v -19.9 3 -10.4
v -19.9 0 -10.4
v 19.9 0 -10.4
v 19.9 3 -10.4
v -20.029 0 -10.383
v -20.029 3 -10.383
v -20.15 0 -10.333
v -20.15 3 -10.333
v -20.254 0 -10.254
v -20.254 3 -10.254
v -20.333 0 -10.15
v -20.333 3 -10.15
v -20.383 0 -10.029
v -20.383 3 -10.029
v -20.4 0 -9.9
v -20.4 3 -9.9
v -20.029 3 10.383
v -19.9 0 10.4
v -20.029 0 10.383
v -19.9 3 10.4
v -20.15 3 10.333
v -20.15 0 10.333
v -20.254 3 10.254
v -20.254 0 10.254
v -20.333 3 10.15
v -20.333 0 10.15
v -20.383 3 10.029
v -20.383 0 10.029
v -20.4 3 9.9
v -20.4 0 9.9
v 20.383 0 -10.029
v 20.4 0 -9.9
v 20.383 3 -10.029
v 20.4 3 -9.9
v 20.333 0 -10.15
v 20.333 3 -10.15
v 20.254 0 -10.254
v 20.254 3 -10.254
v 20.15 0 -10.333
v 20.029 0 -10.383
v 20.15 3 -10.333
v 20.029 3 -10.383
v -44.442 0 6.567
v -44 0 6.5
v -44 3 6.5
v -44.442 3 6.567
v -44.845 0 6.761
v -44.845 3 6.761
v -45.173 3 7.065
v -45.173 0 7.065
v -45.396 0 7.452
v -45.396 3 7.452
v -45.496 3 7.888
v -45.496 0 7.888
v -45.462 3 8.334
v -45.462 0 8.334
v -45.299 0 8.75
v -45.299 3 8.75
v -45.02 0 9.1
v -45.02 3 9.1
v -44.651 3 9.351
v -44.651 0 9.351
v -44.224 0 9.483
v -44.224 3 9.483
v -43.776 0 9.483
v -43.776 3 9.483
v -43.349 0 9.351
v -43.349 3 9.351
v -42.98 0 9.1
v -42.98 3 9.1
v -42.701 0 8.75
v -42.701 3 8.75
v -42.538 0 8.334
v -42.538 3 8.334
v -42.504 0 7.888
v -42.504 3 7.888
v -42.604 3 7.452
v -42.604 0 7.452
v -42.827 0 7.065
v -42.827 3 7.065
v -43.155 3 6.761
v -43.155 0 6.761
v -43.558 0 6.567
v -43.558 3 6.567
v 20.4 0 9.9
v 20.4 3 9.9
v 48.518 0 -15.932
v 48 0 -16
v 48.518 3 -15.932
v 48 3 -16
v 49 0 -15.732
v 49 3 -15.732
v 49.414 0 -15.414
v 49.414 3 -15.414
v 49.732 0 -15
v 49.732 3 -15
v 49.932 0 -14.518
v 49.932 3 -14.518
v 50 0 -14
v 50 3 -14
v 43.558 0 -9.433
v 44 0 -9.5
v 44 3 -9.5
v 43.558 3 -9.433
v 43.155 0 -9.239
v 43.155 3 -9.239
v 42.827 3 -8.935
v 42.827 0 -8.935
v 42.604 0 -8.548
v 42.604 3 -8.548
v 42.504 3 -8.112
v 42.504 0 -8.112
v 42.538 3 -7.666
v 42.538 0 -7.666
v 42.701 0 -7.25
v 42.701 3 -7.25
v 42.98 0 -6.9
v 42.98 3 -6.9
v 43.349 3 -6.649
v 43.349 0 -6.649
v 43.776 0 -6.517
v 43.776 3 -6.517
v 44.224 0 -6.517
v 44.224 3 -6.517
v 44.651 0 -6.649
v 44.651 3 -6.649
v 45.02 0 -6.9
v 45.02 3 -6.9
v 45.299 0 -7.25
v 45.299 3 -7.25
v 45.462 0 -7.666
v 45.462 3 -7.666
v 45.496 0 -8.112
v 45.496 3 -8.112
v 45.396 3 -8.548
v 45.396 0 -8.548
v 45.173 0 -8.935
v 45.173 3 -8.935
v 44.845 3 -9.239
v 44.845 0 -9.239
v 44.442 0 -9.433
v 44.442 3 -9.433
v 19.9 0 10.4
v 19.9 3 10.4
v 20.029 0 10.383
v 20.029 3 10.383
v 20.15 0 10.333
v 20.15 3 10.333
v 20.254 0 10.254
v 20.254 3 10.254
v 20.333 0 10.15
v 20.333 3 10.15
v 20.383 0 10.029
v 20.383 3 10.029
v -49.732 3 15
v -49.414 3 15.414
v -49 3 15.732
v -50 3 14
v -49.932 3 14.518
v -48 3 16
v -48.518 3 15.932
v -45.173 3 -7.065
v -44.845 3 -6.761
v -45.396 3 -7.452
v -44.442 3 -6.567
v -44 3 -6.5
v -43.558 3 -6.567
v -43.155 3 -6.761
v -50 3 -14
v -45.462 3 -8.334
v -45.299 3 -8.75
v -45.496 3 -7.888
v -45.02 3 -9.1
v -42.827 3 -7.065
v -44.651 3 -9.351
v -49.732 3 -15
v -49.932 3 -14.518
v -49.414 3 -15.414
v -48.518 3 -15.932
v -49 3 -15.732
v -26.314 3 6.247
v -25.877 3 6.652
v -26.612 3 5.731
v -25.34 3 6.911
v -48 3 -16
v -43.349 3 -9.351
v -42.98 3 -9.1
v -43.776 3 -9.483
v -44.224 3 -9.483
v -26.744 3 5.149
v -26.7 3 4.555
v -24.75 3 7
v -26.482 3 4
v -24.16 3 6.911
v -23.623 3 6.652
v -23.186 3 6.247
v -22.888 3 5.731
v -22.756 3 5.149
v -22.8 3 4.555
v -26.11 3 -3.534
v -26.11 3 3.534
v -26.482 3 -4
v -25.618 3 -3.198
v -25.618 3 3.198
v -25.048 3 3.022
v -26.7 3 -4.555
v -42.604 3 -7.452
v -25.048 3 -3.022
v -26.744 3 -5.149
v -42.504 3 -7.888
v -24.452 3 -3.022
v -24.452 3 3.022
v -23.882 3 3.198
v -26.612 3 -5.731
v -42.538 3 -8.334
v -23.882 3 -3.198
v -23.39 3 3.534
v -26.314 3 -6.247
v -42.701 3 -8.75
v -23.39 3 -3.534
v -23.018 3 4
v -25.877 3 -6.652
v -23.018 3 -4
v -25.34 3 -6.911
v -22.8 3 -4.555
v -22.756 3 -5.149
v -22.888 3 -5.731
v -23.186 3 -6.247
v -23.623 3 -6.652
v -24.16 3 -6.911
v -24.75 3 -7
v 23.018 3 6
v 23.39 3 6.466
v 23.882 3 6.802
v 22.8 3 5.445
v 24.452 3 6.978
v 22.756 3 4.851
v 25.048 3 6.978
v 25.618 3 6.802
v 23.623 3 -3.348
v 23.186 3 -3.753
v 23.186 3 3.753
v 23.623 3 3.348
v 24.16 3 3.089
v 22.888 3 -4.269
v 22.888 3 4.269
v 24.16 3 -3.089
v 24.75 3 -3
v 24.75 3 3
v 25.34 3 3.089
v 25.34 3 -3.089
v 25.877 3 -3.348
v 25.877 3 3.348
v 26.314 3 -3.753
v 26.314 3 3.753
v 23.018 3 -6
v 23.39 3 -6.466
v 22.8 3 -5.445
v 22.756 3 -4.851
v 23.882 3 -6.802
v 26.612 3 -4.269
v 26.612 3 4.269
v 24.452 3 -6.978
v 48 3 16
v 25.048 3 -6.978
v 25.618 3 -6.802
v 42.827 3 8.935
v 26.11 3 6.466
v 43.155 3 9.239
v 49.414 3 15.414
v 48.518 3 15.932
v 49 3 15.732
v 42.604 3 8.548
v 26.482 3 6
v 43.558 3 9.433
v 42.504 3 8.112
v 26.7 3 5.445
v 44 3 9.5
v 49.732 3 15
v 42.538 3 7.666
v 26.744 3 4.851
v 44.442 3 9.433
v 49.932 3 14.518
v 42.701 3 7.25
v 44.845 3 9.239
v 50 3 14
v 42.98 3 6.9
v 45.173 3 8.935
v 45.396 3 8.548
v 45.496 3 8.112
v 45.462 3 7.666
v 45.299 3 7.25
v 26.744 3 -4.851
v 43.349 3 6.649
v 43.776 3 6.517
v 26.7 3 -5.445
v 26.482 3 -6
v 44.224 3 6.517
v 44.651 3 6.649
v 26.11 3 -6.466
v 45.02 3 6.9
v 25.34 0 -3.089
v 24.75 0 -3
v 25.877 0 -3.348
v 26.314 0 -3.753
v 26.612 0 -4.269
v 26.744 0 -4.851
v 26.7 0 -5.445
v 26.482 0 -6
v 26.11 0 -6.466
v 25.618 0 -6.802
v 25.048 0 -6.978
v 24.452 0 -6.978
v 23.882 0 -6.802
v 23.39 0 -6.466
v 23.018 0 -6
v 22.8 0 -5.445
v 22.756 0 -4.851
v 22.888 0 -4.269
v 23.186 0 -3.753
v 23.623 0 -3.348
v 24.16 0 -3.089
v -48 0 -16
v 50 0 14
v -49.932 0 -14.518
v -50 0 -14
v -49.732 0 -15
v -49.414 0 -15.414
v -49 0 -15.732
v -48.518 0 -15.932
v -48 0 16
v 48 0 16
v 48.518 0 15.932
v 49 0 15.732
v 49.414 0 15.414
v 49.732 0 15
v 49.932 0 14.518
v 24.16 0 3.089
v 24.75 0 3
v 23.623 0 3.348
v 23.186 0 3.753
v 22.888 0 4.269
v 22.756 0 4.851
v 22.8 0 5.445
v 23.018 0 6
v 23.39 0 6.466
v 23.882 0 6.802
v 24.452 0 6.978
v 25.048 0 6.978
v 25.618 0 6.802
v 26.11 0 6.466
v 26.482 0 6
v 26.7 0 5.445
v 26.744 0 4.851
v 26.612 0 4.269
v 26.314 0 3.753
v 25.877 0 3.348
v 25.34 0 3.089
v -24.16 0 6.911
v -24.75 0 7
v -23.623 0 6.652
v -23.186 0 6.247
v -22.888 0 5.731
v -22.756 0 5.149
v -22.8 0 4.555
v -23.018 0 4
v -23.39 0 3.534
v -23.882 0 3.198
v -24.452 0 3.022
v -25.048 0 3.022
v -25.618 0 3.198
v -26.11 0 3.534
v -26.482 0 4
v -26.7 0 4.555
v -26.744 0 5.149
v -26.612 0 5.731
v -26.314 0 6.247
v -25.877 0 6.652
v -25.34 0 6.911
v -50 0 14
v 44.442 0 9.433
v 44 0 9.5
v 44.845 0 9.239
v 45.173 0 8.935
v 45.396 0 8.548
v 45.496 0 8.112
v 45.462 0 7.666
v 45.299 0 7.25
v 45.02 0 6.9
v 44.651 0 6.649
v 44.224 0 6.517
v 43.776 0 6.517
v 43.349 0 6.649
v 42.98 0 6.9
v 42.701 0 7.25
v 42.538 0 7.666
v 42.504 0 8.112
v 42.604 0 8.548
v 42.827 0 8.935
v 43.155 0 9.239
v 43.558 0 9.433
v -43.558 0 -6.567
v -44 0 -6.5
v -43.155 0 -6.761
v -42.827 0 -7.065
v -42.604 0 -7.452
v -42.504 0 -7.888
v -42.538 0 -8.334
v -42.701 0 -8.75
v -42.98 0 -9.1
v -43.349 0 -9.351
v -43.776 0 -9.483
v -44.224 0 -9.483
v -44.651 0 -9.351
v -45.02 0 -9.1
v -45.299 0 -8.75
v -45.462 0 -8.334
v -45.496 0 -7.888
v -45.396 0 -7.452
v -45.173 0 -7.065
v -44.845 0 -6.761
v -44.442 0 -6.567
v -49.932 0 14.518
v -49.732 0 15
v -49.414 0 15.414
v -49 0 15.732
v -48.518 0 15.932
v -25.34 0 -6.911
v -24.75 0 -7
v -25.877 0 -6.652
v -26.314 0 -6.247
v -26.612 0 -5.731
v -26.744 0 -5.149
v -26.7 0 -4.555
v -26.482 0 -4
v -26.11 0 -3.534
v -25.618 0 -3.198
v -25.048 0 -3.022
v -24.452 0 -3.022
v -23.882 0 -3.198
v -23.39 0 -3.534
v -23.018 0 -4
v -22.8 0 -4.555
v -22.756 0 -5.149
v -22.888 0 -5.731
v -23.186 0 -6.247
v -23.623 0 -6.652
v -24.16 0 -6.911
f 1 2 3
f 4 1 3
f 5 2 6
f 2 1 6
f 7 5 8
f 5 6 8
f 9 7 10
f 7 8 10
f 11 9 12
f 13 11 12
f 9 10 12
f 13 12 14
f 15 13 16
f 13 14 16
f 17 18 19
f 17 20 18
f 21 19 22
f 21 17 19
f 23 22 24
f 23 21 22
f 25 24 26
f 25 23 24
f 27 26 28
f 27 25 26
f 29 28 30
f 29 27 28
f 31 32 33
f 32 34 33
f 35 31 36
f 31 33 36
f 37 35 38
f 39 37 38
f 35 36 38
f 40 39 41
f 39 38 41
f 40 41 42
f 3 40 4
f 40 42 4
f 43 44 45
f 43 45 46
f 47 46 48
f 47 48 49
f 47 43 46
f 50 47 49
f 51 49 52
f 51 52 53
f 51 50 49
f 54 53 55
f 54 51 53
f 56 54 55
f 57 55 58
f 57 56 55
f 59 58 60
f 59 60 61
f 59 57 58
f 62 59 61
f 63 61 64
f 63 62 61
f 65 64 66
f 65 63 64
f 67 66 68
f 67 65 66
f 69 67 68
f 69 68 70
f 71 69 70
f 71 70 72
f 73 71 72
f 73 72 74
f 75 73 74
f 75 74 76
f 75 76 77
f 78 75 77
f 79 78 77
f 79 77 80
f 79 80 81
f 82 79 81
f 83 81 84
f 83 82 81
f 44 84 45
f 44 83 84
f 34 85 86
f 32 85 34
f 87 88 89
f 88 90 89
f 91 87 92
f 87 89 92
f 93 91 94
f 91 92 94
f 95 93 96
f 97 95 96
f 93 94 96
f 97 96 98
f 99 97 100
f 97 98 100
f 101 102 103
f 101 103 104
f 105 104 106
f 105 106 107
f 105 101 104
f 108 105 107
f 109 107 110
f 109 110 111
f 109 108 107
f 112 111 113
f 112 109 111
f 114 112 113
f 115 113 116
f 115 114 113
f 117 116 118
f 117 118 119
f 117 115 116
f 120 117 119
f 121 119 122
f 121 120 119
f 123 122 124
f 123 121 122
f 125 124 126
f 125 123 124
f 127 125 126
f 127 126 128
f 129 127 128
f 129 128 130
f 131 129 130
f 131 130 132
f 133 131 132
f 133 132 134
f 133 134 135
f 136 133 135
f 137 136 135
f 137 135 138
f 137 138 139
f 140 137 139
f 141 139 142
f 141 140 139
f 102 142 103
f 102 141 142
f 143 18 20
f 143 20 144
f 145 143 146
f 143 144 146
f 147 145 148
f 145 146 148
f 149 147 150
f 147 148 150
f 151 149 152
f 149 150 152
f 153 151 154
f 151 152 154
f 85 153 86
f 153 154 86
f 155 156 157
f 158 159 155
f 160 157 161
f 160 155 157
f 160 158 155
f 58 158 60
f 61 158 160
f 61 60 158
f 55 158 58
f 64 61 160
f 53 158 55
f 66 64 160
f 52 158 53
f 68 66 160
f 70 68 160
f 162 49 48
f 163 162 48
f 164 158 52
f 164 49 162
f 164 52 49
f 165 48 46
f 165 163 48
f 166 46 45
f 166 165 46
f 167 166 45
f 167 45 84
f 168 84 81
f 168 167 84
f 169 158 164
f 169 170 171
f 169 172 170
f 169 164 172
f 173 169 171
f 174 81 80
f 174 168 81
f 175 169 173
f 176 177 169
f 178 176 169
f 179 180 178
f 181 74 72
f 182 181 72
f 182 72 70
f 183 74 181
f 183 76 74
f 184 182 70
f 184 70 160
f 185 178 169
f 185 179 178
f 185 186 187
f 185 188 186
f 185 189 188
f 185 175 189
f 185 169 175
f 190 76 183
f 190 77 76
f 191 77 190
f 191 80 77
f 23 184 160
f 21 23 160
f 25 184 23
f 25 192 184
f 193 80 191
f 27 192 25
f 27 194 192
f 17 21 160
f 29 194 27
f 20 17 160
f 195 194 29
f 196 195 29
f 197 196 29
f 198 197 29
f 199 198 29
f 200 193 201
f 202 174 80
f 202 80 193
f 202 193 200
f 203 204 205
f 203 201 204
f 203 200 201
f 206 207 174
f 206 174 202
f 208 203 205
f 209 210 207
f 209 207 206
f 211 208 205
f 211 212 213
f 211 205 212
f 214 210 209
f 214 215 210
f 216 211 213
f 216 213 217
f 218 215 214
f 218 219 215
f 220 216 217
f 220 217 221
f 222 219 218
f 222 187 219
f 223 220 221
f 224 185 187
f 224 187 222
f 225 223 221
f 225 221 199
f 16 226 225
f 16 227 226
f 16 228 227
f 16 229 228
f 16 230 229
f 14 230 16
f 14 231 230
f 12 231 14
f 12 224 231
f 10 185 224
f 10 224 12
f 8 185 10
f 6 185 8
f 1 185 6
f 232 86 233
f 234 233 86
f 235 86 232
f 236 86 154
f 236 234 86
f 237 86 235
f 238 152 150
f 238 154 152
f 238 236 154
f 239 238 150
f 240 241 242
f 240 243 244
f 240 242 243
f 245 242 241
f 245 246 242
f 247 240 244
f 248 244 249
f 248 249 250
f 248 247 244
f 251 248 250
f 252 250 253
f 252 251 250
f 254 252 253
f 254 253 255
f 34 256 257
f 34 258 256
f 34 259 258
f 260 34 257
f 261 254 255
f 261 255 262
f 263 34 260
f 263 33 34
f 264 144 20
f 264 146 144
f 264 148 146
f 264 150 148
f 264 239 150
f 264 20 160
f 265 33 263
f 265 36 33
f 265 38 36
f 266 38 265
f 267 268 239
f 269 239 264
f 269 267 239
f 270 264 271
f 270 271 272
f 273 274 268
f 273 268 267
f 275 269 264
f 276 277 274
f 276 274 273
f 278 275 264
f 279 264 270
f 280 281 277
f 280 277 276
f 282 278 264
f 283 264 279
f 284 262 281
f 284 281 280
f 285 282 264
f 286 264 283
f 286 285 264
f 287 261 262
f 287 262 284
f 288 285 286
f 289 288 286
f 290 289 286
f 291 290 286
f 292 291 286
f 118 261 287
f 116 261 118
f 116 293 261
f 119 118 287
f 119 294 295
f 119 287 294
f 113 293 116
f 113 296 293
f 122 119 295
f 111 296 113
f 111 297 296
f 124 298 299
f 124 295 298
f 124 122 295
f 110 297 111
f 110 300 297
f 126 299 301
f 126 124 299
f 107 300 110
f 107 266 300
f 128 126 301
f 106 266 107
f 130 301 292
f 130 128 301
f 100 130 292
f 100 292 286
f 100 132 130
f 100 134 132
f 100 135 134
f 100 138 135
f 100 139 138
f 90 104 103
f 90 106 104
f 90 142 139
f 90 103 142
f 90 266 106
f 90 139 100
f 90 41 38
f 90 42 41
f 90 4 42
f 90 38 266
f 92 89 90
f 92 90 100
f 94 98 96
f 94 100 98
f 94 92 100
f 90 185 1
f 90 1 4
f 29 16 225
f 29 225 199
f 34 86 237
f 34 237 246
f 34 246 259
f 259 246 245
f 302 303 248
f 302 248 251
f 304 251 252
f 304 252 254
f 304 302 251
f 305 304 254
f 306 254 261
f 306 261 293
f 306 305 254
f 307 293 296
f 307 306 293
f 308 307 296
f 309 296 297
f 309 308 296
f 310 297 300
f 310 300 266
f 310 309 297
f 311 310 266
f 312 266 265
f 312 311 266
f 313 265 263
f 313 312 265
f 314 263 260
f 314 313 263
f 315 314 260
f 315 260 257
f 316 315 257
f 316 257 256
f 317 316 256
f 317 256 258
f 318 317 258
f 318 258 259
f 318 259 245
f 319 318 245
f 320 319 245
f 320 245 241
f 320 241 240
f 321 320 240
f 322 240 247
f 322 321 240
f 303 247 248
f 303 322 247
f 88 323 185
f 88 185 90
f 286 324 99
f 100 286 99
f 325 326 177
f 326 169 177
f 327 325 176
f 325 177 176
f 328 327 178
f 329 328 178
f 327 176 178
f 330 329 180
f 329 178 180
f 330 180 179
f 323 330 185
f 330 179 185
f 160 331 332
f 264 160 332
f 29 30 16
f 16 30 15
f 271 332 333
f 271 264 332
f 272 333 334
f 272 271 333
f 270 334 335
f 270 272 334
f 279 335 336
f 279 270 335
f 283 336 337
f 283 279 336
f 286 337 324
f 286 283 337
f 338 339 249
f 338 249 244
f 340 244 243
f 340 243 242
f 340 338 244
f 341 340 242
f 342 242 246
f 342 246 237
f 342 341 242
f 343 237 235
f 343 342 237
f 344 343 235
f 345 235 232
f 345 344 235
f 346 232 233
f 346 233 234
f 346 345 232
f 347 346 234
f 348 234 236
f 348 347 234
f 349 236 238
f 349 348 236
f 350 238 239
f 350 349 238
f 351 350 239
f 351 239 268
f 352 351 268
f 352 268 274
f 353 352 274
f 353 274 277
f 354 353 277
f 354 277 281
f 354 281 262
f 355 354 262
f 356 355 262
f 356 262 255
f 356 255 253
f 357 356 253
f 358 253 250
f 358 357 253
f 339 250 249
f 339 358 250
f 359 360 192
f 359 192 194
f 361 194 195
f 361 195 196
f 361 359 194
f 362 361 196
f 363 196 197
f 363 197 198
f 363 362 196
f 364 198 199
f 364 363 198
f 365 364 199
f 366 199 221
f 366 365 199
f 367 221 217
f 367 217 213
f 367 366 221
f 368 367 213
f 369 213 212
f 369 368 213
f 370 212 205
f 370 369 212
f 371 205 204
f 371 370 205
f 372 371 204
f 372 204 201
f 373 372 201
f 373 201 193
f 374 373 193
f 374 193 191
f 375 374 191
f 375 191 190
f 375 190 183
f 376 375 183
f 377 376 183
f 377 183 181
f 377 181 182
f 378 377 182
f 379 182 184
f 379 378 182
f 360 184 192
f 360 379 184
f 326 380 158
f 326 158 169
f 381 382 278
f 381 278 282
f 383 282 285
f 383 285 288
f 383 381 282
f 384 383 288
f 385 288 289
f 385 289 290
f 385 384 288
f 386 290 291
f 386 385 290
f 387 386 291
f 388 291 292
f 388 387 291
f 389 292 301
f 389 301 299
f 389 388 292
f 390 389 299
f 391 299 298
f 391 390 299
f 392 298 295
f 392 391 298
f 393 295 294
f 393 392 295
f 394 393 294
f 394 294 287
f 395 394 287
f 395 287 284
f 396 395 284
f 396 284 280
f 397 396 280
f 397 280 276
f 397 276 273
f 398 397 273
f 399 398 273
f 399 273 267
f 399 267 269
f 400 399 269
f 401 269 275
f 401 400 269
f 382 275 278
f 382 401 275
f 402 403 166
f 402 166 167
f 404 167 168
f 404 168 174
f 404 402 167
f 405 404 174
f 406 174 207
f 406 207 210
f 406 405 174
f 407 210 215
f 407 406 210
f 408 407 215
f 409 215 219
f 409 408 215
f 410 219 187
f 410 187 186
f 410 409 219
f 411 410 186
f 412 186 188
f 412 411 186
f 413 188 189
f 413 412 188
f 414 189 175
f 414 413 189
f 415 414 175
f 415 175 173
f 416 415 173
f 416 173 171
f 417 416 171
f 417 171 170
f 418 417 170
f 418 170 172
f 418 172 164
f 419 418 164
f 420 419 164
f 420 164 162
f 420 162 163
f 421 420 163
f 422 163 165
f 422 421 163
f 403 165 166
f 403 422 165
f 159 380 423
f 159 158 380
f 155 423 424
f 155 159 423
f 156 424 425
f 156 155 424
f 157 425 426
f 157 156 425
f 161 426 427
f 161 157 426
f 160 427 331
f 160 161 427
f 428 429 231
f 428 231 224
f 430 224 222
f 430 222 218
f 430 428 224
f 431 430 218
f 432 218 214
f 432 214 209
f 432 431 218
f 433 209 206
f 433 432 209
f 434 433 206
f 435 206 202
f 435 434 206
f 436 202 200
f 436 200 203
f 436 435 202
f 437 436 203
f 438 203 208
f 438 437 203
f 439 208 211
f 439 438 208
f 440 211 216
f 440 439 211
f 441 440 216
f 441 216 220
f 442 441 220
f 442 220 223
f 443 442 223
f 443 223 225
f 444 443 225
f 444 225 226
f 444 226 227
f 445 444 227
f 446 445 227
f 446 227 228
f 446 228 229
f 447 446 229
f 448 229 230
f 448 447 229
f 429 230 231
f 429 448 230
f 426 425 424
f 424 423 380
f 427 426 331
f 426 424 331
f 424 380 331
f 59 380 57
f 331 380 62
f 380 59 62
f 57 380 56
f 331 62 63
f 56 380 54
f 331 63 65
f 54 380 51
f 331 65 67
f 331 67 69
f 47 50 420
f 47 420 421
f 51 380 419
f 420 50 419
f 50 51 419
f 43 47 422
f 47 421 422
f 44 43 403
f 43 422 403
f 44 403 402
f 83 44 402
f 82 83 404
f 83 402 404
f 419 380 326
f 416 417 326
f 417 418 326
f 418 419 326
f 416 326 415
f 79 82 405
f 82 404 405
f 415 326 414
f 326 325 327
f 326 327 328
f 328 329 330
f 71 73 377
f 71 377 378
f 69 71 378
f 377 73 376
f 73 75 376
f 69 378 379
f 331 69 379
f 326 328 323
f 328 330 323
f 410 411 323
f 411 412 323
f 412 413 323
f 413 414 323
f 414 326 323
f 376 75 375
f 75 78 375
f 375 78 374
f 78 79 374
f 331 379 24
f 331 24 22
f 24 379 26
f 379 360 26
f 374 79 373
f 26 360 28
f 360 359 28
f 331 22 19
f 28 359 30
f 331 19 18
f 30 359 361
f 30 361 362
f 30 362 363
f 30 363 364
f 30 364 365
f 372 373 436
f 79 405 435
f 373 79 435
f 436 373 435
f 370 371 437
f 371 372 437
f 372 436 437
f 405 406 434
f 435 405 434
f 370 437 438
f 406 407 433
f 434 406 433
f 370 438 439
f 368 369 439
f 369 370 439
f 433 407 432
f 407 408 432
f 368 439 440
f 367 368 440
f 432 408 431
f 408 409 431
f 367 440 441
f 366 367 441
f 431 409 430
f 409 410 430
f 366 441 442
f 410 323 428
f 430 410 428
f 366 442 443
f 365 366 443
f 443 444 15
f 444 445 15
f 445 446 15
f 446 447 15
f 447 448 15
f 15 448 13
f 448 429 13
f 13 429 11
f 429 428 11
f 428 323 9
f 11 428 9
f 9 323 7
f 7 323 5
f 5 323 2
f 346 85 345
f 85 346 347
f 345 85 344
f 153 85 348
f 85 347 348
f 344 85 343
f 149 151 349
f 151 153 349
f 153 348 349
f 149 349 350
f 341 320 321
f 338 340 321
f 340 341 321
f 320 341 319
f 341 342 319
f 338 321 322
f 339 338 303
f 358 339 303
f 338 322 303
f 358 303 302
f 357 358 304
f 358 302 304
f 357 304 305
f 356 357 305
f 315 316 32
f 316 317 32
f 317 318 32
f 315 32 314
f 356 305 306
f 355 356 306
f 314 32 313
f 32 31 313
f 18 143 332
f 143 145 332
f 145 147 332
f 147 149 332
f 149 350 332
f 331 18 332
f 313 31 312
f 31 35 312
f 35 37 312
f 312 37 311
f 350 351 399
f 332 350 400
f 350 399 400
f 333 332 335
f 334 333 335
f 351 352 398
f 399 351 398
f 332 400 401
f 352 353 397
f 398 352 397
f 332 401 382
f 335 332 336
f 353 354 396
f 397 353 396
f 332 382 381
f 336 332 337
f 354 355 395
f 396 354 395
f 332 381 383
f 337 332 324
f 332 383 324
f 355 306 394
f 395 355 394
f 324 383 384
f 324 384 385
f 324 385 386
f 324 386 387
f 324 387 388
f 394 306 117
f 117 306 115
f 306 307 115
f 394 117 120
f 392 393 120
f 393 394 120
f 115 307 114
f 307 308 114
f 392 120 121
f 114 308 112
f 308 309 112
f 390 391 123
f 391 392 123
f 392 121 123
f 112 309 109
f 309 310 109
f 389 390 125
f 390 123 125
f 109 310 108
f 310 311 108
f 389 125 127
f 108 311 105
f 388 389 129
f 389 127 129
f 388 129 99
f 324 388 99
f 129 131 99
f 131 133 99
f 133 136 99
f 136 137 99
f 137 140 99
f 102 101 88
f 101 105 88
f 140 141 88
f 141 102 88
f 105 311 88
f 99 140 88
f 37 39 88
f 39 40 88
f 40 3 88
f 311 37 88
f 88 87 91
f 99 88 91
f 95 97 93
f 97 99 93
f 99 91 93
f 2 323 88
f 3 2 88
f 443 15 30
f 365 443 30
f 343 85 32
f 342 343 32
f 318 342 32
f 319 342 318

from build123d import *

# Parameters (mm, degrees)
SKETCH_1_W      = 100
SKETCH_1_H      = 32
SKETCH_1_R      = 2
SKETCH_1_R_2    = 1.5
SKETCH_1_W_2    = 40.8
SKETCH_1_H_2    = 20.8
EXTRUDE_1_DEPTH = 3
FILLET_1_R      = 0.5
FILLET_2_R      = 2


with BuildPart() as part:
    # 草图1 → 凸台-拉伸1 (new body)
    with BuildSketch(Plane(origin=(0, 0, 0), x_dir=(1, 0, 0), z_dir=(0, 1, 0))):
        Rectangle(SKETCH_1_W, SKETCH_1_H)
        with Locations(Location((24.75, 5, 0), (0, 0, 270))):
            Circle(SKETCH_1_R, mode=Mode.SUBTRACT)
        with Locations(Location((24.75, -5, 0), (0, 0, 90))):
            Circle(SKETCH_1_R, mode=Mode.SUBTRACT)
        with Locations(Location((-24.75, -5, 0), (0, 0, 270))):
            Circle(SKETCH_1_R, mode=Mode.SUBTRACT)
        with Locations(Location((-24.75, 5, 0), (0, 0, 90))):
            Circle(SKETCH_1_R, mode=Mode.SUBTRACT)
        with Locations(Location((-44, 8, 0), (0, 0, 270))):
            Circle(SKETCH_1_R_2, mode=Mode.SUBTRACT)
        with Locations(Location((44, 8, 0), (0, 0, 90))):
            Circle(SKETCH_1_R_2, mode=Mode.SUBTRACT)
        with Locations(Location((44, -8, 0), (0, 0, 270))):
            Circle(SKETCH_1_R_2, mode=Mode.SUBTRACT)
        with Locations(Location((-44, -8, 0), (0, 0, 90))):
            Circle(SKETCH_1_R_2, mode=Mode.SUBTRACT)
        Rectangle(SKETCH_1_W_2, SKETCH_1_H_2, mode=Mode.SUBTRACT)
    extrude(amount=EXTRUDE_1_DEPTH)

    # 圆角1
    fillet_1_edges = [part.edges().sort_by_distance(p)[0] for p in [
        (20.4, 1.5, 10.4),
        (20.4, 1.5, -10.4),
        (-20.4, 1.5, -10.4),
        (-20.4, 1.5, 10.4),
    ]]
    fillet(fillet_1_edges, radius=FILLET_1_R)

    # 圆角2
    fillet_2_edges = [part.edges().sort_by_distance(p)[0] for p in [
        (50, 1.5, 16),
        (-50, 1.5, 16),
        (-50, 1.5, -16),
        (50, 1.5, -16),
    ]]
    fillet(fillet_2_edges, radius=FILLET_2_R)


solid = part.part
